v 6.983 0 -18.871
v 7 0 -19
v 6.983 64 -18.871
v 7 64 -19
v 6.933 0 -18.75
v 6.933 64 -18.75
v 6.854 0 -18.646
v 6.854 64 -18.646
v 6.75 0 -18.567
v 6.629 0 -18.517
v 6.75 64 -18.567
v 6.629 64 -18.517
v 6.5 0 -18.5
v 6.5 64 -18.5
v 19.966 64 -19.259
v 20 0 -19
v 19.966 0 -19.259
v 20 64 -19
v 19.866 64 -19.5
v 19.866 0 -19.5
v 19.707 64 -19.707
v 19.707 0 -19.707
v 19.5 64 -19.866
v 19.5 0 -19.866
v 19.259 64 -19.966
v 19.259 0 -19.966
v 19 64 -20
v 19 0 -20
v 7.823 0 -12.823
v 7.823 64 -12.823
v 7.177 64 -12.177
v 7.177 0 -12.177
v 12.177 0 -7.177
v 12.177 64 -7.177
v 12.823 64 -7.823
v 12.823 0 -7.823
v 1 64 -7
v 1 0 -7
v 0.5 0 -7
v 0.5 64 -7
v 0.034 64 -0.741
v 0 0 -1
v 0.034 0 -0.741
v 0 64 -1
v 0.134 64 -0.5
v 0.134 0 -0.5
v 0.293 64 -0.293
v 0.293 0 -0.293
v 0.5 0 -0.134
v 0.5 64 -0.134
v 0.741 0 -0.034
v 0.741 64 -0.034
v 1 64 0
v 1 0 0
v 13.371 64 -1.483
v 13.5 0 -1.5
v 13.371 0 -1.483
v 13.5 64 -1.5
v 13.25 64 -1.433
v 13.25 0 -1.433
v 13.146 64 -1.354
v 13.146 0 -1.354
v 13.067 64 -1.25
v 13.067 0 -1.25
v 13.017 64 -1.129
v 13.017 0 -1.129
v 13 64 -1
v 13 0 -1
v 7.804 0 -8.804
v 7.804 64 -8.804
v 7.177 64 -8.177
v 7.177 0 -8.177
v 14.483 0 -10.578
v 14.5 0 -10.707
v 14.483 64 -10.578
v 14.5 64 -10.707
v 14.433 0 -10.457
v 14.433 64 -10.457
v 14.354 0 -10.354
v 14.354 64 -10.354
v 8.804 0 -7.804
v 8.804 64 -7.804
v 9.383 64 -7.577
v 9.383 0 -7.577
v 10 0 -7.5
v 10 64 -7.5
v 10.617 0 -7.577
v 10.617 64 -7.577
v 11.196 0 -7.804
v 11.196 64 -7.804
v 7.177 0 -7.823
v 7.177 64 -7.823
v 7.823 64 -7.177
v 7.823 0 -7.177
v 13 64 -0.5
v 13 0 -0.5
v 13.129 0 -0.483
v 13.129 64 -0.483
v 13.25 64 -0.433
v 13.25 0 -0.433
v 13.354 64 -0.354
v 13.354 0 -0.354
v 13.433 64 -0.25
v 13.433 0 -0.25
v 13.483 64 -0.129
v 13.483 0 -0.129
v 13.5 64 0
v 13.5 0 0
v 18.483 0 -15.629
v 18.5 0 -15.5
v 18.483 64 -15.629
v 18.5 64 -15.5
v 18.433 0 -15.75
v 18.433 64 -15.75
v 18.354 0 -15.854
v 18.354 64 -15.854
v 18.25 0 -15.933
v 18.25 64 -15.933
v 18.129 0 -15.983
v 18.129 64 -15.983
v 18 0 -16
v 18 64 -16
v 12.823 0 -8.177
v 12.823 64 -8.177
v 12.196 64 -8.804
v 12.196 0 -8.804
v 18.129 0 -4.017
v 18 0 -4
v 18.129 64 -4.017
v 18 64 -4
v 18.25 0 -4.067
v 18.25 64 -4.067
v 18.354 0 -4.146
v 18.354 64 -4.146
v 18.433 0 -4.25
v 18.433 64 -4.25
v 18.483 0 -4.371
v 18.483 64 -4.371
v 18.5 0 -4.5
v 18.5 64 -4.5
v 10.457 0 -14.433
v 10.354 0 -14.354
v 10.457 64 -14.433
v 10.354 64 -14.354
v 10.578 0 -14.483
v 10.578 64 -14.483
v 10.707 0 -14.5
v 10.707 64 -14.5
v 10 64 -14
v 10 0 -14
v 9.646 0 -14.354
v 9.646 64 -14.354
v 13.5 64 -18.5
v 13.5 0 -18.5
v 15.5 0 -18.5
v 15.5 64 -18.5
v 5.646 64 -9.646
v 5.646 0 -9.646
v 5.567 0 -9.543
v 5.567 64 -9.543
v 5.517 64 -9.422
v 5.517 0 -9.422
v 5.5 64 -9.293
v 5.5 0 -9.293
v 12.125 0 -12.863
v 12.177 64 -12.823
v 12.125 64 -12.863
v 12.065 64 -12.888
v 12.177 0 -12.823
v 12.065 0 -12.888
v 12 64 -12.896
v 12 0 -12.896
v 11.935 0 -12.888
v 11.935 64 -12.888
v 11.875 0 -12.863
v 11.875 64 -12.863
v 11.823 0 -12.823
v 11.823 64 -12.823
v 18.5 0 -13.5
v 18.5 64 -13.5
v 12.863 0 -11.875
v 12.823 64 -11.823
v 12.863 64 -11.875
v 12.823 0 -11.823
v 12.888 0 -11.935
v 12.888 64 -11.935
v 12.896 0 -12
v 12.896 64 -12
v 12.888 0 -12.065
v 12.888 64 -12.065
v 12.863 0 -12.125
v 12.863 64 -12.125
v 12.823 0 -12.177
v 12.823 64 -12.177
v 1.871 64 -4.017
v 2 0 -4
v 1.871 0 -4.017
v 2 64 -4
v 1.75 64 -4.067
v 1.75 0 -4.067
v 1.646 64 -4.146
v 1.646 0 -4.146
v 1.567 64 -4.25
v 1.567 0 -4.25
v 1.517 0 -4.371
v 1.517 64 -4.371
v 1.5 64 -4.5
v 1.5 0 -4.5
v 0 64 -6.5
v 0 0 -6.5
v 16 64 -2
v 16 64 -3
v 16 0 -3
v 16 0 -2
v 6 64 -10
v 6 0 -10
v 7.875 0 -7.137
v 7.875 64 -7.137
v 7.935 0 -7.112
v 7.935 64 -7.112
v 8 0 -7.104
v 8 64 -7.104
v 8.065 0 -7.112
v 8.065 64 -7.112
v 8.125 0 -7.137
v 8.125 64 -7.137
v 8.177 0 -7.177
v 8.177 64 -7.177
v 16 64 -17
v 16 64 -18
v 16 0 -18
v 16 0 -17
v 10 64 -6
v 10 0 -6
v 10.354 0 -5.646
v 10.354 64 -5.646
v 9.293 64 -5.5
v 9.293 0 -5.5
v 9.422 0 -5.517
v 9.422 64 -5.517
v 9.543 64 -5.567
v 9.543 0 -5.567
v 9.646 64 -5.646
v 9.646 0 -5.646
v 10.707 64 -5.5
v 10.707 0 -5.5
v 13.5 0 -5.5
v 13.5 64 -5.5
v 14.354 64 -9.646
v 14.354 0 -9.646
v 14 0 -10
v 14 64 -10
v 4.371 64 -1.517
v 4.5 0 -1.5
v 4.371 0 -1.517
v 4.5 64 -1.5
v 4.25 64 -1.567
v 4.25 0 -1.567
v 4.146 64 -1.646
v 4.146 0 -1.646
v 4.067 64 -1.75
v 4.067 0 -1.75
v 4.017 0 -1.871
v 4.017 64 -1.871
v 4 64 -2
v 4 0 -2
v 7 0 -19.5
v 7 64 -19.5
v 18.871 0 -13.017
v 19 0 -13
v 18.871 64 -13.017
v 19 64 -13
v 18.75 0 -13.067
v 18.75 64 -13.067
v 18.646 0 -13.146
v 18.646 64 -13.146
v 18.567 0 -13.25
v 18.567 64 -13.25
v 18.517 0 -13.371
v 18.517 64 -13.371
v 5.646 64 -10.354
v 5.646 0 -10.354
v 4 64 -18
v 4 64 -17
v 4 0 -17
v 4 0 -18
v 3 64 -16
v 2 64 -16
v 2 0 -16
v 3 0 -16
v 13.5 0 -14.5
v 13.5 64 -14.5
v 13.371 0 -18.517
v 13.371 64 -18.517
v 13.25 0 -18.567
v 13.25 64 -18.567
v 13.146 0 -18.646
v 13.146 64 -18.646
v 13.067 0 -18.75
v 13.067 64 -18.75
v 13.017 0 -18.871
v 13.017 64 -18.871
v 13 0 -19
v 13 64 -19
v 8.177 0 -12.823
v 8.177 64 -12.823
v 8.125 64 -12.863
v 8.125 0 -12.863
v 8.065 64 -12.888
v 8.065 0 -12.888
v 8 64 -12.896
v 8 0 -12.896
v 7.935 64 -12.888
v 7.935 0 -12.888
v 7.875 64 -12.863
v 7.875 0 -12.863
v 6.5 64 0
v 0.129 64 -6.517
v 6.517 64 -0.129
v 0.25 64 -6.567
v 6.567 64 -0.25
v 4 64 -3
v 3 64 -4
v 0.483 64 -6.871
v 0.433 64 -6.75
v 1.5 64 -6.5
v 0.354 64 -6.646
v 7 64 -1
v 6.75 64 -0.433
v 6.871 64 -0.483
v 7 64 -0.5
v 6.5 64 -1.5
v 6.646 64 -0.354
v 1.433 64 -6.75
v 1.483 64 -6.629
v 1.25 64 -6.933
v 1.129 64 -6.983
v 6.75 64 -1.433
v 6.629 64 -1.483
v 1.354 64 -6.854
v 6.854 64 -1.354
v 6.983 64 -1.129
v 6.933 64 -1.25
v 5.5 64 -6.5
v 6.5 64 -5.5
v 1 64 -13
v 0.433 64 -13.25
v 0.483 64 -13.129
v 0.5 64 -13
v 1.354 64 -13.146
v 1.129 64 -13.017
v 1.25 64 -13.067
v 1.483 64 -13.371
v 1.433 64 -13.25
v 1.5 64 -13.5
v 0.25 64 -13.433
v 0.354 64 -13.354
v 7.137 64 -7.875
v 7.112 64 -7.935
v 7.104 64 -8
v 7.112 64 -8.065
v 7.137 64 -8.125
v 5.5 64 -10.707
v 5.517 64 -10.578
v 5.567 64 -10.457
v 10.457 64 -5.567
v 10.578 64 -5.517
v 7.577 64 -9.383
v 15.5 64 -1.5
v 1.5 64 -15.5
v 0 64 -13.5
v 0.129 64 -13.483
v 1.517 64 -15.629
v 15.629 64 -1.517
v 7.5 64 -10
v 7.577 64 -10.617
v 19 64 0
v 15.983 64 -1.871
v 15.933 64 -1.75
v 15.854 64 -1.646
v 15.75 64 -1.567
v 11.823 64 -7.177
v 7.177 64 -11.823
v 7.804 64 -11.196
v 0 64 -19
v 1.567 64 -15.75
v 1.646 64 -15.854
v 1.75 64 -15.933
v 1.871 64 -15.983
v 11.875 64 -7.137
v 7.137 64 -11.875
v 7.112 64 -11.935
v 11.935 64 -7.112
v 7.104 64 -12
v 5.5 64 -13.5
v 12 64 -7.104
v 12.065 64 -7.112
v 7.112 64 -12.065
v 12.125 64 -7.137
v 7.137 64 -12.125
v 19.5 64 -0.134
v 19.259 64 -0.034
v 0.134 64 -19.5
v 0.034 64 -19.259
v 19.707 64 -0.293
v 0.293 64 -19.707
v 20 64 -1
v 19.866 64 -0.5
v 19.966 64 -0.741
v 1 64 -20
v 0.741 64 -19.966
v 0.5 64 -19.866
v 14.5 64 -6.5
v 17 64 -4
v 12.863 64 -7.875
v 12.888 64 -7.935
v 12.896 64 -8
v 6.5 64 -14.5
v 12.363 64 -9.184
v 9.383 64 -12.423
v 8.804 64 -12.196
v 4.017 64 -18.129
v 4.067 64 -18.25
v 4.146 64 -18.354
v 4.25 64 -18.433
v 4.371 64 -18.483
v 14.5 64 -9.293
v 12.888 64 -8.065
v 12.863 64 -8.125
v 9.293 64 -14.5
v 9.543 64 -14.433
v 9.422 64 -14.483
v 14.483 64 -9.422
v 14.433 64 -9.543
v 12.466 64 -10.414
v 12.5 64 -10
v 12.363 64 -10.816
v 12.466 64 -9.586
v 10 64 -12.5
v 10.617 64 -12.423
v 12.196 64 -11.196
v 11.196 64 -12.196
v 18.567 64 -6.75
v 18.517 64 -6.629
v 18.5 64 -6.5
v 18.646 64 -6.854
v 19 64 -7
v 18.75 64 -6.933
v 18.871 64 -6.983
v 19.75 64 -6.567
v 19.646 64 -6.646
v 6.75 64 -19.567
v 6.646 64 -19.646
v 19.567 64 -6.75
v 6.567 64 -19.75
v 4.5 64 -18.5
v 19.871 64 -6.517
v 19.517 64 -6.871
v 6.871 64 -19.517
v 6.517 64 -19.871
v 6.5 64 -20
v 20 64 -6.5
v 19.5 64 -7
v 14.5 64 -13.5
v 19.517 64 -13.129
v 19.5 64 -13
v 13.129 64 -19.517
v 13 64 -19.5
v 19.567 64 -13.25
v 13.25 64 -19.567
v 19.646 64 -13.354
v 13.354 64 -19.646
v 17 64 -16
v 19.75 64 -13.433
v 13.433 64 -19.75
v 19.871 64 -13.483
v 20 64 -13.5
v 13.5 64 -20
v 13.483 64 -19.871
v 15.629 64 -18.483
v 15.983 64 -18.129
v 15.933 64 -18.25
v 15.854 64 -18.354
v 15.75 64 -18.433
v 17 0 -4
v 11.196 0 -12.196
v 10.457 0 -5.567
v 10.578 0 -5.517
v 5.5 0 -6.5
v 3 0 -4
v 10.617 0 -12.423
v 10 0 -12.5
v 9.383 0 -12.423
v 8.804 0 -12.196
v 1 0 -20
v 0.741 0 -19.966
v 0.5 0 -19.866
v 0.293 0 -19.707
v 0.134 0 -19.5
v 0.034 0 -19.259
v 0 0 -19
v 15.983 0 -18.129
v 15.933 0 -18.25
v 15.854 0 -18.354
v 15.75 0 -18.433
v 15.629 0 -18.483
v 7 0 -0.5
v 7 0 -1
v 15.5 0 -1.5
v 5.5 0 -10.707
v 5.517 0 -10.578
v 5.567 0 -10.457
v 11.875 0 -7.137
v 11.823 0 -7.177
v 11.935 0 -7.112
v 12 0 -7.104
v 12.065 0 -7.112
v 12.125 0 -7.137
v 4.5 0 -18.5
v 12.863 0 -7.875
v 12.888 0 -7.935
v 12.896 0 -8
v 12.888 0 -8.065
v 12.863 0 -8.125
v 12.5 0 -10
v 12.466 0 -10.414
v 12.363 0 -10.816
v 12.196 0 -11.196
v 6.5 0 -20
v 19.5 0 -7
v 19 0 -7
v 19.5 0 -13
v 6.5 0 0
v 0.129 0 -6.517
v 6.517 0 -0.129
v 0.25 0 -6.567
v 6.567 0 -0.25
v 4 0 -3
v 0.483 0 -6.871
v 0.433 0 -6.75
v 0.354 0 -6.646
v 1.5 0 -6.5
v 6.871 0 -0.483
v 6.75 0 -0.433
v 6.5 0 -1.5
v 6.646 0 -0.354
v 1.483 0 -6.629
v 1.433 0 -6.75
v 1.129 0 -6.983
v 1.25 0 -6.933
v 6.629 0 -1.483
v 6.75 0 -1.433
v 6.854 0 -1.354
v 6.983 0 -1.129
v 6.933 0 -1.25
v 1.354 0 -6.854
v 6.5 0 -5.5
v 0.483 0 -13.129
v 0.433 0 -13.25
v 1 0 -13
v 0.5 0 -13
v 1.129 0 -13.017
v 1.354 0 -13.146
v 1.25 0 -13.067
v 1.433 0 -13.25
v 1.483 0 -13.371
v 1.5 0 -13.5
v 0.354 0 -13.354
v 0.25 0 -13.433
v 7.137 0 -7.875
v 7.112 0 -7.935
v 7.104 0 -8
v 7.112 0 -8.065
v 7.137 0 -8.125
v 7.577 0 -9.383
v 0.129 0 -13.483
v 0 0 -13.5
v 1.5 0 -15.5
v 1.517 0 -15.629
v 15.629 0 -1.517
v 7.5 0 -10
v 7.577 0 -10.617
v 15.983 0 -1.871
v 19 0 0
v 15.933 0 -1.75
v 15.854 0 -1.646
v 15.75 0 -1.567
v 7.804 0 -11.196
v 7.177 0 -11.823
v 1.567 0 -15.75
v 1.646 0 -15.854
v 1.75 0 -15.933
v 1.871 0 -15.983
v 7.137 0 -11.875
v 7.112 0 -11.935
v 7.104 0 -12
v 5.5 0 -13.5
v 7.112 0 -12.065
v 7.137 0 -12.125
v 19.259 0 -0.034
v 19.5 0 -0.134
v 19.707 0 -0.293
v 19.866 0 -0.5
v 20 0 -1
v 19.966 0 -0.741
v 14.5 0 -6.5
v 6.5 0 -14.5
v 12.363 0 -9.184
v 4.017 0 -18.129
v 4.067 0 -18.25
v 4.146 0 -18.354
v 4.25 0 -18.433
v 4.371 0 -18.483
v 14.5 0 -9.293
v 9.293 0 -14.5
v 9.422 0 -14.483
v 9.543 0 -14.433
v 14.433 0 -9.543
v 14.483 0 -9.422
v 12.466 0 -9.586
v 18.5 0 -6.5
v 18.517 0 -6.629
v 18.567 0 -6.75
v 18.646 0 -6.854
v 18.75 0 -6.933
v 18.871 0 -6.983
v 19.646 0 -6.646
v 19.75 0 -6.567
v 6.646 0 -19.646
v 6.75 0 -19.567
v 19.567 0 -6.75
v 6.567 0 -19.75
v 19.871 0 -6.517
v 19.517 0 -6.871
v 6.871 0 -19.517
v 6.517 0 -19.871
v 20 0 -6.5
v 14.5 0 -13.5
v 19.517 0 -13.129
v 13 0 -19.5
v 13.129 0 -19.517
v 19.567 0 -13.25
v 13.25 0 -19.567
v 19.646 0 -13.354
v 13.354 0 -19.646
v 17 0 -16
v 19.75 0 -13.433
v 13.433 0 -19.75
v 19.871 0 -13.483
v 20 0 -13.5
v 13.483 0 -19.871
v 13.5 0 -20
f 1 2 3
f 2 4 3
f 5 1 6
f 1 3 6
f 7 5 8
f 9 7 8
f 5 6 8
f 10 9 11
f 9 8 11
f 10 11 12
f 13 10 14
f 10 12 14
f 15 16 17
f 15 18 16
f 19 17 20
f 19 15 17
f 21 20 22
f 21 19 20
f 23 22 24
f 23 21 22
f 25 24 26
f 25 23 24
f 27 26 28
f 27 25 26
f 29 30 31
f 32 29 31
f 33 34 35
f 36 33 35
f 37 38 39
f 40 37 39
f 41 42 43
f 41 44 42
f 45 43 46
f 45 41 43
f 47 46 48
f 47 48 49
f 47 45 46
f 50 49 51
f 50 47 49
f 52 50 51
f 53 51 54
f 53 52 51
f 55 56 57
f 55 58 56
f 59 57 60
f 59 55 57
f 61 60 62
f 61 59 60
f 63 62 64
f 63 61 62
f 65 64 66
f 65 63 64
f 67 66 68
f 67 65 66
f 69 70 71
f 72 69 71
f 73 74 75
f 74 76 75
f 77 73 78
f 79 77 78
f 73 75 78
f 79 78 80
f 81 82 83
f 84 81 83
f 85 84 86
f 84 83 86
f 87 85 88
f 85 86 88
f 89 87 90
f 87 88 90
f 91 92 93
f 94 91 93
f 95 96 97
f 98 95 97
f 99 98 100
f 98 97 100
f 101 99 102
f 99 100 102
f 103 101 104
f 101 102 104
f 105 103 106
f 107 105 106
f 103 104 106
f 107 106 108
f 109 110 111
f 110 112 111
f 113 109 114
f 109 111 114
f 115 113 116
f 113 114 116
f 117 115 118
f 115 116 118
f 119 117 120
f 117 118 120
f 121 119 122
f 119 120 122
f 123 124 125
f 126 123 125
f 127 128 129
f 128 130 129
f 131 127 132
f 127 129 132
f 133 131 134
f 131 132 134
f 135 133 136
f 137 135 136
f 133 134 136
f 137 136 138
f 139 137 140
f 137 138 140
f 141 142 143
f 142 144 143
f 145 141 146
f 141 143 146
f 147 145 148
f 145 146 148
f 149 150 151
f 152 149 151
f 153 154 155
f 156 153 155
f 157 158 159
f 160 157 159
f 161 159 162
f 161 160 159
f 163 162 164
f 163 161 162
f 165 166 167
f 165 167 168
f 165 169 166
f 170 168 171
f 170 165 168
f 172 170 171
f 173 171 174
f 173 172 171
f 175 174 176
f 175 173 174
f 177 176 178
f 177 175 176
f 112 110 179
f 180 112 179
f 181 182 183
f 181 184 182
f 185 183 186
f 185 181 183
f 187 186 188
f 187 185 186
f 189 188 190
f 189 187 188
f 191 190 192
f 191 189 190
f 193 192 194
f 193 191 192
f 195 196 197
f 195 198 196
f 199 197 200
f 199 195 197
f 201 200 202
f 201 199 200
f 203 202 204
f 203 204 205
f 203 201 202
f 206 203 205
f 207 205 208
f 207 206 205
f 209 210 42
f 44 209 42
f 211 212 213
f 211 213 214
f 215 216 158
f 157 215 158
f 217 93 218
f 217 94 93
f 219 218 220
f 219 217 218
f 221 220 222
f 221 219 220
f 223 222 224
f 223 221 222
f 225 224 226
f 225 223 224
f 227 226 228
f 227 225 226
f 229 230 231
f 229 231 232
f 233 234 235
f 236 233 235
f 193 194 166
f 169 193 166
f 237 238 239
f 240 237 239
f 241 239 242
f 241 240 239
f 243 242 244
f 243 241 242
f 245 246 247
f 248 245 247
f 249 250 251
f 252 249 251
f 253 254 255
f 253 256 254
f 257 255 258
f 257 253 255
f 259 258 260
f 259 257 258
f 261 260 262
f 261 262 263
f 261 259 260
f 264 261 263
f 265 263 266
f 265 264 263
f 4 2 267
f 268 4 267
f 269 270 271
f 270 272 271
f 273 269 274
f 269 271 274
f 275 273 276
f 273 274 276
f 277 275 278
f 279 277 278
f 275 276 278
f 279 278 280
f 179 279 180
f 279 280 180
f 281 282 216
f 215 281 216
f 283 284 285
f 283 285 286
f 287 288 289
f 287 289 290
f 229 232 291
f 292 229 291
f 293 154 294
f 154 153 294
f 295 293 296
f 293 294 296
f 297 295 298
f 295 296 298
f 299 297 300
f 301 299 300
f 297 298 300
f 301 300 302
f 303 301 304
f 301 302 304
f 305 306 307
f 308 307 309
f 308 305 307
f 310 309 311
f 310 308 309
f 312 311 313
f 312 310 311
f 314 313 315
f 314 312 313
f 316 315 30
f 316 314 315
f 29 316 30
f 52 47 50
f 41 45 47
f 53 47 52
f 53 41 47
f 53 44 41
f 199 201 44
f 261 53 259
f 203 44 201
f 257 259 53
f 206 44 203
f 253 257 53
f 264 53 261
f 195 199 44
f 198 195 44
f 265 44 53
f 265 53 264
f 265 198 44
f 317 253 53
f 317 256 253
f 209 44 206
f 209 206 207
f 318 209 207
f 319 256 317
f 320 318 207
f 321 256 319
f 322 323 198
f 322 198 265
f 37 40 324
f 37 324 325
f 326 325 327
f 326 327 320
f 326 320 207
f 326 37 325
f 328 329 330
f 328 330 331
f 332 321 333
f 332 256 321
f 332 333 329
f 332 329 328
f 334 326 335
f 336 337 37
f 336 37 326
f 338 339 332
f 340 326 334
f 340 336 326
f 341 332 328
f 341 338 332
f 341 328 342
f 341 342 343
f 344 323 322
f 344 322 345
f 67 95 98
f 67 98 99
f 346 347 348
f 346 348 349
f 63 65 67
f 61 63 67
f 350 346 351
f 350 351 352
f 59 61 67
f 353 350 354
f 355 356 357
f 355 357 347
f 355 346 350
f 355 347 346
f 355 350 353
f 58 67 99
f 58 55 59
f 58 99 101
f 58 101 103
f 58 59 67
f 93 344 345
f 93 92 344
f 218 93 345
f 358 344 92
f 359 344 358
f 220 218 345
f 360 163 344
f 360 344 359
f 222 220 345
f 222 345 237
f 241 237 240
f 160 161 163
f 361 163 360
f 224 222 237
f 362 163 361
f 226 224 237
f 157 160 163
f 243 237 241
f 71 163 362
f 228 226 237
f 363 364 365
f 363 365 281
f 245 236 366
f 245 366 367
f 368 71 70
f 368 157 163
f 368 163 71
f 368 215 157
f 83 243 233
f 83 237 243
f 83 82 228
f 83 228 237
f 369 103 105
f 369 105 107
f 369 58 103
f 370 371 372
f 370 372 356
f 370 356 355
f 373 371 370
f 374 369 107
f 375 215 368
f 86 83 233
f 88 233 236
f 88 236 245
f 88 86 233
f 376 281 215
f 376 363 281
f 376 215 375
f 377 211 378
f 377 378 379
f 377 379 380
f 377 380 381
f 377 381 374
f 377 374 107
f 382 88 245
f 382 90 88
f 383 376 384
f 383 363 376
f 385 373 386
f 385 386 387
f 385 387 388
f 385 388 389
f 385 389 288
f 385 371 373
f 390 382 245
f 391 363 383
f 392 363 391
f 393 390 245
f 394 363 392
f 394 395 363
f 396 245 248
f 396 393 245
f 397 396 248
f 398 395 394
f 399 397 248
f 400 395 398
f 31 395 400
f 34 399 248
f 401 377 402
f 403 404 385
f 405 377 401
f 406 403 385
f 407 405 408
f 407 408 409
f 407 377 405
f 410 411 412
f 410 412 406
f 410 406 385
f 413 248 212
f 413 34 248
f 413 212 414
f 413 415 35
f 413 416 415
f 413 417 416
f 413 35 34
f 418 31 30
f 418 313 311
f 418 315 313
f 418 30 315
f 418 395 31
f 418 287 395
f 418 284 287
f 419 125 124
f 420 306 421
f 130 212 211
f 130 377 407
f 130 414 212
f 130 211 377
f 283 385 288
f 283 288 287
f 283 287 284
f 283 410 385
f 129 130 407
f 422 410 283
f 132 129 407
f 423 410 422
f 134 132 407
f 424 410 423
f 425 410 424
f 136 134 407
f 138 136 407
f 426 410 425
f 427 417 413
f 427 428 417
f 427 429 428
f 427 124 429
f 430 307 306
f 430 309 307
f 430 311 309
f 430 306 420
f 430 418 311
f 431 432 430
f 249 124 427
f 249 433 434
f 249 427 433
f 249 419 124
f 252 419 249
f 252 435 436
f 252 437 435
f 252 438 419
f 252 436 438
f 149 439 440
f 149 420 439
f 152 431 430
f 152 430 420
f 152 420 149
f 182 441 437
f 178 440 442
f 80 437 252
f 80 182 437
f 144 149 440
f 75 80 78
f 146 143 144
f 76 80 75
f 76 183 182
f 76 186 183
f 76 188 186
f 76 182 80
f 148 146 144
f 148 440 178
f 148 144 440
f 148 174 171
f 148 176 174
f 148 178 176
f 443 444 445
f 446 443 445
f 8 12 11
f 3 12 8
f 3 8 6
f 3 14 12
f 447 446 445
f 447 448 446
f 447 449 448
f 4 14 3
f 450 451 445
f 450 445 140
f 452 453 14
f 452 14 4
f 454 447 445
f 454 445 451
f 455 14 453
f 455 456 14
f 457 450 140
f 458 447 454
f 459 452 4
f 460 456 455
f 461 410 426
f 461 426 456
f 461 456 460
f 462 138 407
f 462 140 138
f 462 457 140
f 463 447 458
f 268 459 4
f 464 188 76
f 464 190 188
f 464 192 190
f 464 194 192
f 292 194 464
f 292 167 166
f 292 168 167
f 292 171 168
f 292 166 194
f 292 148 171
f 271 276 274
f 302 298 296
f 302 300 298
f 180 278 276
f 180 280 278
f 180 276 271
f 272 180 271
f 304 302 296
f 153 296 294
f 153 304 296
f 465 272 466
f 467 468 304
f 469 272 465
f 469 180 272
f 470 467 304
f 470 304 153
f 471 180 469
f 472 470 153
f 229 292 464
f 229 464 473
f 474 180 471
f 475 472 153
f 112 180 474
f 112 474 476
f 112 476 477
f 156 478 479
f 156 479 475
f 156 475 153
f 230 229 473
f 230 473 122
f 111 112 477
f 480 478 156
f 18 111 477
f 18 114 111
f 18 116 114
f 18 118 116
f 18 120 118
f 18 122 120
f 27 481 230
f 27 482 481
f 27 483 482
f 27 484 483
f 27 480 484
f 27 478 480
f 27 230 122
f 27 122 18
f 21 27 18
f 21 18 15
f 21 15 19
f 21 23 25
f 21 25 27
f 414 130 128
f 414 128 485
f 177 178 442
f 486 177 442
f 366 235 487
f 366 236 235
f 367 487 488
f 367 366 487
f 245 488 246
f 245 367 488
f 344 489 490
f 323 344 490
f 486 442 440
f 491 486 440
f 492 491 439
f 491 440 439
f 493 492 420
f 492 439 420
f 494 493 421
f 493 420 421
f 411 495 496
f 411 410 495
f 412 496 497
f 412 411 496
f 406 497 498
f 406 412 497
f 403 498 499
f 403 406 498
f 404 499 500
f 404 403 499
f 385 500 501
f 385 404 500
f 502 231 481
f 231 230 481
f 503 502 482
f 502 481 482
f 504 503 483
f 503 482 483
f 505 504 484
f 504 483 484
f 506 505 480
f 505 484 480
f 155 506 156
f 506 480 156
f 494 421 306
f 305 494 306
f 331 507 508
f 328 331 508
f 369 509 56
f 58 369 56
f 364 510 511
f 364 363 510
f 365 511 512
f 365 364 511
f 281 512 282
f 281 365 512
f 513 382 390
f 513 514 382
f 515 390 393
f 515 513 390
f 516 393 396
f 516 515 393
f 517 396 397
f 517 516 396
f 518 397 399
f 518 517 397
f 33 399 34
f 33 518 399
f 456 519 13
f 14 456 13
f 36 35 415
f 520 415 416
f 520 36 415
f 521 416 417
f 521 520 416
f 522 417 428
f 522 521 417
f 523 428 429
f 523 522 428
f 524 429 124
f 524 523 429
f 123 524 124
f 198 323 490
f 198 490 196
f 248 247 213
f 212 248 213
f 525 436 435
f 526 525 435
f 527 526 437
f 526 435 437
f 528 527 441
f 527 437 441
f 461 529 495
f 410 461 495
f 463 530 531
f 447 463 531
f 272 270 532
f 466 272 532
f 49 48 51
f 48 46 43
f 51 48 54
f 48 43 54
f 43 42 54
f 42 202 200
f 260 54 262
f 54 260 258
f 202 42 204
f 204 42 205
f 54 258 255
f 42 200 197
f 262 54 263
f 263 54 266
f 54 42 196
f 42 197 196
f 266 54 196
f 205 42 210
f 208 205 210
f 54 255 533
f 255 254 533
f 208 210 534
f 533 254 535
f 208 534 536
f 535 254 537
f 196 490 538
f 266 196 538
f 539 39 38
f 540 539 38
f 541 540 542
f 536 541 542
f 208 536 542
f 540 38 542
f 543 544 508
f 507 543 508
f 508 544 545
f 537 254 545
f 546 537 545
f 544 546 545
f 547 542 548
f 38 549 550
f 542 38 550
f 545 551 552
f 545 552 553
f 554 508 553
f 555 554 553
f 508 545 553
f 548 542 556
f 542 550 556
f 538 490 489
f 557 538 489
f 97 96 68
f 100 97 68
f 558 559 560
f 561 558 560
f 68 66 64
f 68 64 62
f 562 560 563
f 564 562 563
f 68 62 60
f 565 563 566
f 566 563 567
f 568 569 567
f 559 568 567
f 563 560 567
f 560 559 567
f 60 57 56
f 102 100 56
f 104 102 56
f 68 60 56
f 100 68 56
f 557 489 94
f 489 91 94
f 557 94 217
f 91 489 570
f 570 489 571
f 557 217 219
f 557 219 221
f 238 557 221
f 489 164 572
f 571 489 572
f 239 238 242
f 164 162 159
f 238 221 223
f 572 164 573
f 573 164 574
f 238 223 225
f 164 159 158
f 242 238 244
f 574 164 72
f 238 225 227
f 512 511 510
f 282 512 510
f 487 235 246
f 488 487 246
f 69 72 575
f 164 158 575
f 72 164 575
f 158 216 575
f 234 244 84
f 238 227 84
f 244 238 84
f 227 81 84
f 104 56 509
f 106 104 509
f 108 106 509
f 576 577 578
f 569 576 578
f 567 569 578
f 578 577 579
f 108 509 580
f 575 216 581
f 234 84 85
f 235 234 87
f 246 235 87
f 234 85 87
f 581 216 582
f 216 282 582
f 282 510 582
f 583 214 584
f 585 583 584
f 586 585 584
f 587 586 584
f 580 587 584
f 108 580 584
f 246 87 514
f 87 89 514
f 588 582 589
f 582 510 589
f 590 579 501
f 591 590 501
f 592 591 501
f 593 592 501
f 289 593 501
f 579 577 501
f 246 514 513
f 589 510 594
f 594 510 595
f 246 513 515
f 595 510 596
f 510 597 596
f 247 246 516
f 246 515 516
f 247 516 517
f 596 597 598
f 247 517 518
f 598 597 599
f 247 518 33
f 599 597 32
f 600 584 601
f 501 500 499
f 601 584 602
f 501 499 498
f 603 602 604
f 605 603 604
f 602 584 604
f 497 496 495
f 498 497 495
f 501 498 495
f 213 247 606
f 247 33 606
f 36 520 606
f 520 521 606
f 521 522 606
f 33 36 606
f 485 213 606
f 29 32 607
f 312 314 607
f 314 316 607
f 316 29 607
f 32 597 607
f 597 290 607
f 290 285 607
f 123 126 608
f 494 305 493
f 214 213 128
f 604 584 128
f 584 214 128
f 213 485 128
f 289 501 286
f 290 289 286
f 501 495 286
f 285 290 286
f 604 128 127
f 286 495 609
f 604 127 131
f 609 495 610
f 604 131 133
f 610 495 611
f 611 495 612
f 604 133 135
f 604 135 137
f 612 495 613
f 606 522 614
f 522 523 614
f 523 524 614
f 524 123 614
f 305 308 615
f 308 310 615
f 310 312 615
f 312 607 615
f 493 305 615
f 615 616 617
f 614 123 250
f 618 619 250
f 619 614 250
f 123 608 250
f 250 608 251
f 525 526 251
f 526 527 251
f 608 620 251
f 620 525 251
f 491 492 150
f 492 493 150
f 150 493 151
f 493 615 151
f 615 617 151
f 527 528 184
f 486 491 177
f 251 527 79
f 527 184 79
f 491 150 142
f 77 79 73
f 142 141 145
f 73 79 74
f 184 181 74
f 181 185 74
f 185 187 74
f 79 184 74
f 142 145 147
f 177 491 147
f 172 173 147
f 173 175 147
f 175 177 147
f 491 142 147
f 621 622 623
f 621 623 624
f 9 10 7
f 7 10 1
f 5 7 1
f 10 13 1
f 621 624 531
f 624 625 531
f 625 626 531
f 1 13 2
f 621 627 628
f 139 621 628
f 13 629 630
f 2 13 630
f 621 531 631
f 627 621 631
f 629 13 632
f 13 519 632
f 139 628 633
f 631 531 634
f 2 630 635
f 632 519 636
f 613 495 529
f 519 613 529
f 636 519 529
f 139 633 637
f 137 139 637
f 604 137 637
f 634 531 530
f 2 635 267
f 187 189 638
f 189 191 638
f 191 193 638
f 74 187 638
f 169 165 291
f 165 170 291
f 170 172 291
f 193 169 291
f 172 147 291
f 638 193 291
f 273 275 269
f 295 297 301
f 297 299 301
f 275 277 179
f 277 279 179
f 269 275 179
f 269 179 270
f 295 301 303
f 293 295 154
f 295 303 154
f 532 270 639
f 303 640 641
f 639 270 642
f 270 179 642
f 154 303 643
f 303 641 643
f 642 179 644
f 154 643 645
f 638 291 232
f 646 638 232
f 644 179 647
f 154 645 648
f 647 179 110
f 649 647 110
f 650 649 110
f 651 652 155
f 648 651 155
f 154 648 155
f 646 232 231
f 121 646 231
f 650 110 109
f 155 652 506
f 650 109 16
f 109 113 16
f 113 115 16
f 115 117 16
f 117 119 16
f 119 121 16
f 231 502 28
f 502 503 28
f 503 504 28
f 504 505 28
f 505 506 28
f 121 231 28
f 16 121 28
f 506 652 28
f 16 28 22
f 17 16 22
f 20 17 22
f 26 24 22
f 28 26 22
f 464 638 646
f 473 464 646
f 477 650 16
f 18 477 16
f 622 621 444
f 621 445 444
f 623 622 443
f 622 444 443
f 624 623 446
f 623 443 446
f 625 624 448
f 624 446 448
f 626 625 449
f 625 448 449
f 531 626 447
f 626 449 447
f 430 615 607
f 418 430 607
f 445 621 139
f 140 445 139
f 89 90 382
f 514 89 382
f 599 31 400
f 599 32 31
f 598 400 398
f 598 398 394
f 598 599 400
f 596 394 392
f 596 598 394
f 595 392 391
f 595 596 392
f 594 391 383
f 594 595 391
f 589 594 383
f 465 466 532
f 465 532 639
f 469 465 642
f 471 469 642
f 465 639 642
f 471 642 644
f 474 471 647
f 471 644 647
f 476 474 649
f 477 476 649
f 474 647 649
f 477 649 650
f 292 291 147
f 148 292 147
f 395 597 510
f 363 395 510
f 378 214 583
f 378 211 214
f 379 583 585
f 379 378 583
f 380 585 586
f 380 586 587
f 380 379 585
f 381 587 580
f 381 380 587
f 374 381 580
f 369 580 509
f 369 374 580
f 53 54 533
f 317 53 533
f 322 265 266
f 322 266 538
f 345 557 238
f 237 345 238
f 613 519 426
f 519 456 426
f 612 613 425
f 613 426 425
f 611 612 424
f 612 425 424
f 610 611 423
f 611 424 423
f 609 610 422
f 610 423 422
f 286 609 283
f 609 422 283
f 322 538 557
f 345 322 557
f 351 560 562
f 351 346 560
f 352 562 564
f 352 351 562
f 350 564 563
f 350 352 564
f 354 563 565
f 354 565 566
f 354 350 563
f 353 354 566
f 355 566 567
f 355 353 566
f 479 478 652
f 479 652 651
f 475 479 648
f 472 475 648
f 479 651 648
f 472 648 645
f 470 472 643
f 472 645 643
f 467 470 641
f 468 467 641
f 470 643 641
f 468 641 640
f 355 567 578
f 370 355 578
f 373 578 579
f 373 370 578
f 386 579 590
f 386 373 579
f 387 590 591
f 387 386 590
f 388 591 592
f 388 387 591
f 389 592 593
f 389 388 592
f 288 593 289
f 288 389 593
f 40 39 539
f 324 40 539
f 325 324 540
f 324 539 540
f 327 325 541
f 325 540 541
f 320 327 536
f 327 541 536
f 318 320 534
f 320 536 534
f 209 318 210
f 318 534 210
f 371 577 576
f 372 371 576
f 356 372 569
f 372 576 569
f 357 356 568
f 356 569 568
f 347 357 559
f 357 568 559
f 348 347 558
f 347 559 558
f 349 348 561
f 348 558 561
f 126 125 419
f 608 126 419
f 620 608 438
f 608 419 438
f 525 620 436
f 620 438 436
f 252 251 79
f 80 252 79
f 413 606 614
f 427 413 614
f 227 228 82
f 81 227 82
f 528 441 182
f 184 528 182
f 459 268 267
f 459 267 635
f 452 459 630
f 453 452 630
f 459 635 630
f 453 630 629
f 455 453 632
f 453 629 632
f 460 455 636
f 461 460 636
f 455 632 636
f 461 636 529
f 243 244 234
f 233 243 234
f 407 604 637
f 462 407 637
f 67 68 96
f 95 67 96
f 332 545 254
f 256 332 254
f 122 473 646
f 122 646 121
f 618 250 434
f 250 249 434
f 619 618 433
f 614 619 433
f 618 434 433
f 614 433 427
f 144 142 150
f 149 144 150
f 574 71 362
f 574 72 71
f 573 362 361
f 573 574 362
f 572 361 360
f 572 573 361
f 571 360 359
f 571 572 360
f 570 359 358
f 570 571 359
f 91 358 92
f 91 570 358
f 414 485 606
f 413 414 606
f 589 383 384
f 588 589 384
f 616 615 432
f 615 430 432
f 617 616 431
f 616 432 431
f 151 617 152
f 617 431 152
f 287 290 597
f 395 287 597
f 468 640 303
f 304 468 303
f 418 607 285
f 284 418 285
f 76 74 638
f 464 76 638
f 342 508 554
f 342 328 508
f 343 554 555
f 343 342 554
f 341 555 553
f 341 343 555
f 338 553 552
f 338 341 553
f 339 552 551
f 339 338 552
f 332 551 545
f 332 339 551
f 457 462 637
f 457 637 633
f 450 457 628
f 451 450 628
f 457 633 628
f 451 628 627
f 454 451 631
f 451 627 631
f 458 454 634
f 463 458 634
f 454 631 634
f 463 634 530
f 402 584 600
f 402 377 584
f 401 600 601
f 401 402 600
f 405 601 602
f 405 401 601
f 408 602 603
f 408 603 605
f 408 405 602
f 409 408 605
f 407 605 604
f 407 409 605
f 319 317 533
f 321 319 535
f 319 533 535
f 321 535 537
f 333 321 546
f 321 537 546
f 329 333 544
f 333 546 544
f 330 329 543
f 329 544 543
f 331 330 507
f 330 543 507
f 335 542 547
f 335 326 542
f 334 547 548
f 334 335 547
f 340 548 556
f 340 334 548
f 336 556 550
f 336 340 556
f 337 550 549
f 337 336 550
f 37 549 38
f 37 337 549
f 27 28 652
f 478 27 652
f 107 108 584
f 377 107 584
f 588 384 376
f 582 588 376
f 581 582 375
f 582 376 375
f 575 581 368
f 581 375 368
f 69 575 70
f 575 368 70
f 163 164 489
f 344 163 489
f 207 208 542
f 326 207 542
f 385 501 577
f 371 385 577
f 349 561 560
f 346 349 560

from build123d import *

# Parameters (mm, degrees)
BOSS_EXTRUDE1_DEPTH = 64
FILLET1_R           = 1
CUT_EXTRUDE1_DEPTH  = 65
FILLET2_R           = 0.5
FILLET3_R           = 0.25


with BuildPart() as part:
    # Sketch3 → Boss-Extrude1 (new body)
    with BuildSketch(Plane(origin=(0, 0, 0), x_dir=(1, 0, 0), z_dir=(0, 1, 0))):
        with BuildLine():
            Line((7, 18.5), (7, 19.5))
            ThreePointArc((7, 19.5), (6.646446609, 19.646446609), (6.5, 20))
            Line((6.5, 20), (0, 20))
            Line((0, 20), (0, 13.5))
            ThreePointArc((0, 13.5), (0.353553391, 13.353553391), (0.5, 13))
            Line((0.5, 13), (1.5, 13))
            Line((1.5, 13), (1.5, 16))
            Line((1.5, 16), (3, 16))
            Line((3, 16), (5.5, 13.5))
            Line((5.5, 13.5), (5.5, 10.5))
            Line((5.5, 10.5), (6, 10))
            Line((6, 10), (5.5, 9.5))
            Line((5.5, 9.5), (5.5, 6.5))
            Line((5.5, 6.5), (3, 4))
            Line((3, 4), (1.5, 4))
            Line((1.5, 4), (1.5, 7))
            Line((1.5, 7), (0.5, 7))
            ThreePointArc((0.5, 7), (0.353553391, 6.646446609), (0, 6.5))
            Line((0, 6.5), (0, 0))
            Line((0, 0), (6.5, 0))
            ThreePointArc((6.5, 0), (6.646446609, 0.353553391), (7, 0.5))
            Line((7, 0.5), (7, 1.5))
            Line((7, 1.5), (4, 1.5))
            Line((4, 1.5), (4, 3))
            Line((4, 3), (6.5, 5.5))
            Line((6.5, 5.5), (9.5, 5.5))
            Line((9.5, 5.5), (10, 6))
            Line((10, 6), (10.5, 5.5))
            Line((10.5, 5.5), (13.5, 5.5))
            Line((13.5, 5.5), (16, 3))
            Line((16, 3), (16, 1.5))
            Line((16, 1.5), (13, 1.5))
            Line((13, 1.5), (13, 0.5))
            ThreePointArc((13, 0.5), (13.353553391, 0.353553391), (13.5, 0))
            Line((13.5, 0), (20, 0))
            Line((20, 0), (20, 6.5))
            ThreePointArc((20, 6.5), (19.646446609, 6.646446609), (19.5, 7))
            Line((19.5, 7), (18.5, 7))
            Line((18.5, 7), (18.5, 4))
            Line((18.5, 4), (17, 4))
            Line((17, 4), (14.5, 6.5))
            Line((14.5, 6.5), (14.5, 9.5))
            Line((14.5, 9.5), (14, 10))
            Line((14, 10), (14.5, 10.5))
            Line((14.5, 10.5), (14.5, 13.5))
            Line((14.5, 13.5), (17, 16))
            Line((17, 16), (18.5, 16))
            Line((18.5, 16), (18.5, 13))
            Line((18.5, 13), (19.5, 13))
            ThreePointArc((19.5, 13), (19.646446609, 13.353553391), (20, 13.5))
            Line((20, 13.5), (20, 20))
            Line((20, 20), (13.5, 20))
            ThreePointArc((13.5, 20), (13.353553391, 19.646446609), (13, 19.5))
            Line((13, 19.5), (13, 18.5))
            Line((13, 18.5), (16, 18.5))
            Line((16, 18.5), (16, 17))
            Line((16, 17), (13.5, 14.5))
            Line((13.5, 14.5), (10.5, 14.5))
            Line((10.5, 14.5), (10, 14))
            Line((10, 14), (9.5, 14.5))
            Line((9.5, 14.5), (6.5, 14.5))
            Line((6.5, 14.5), (4, 17))
            Line((4, 17), (4, 18.5))
            Line((4, 18.5), (7, 18.5))
        make_face()
    extrude(amount=BOSS_EXTRUDE1_DEPTH)

    # Fillet1
    fillet1_edges = [part.edges().sort_by_distance(p)[0] for p in [
        (20, 32, 0),
        (0, 32, 0),
        (0, 32, -20),
        (20, 32, -20),
    ]]
    fillet(fillet1_edges, radius=FILLET1_R)

    # Sketch4 → Cut-Extrude1 (cut, through all)
    with BuildSketch(Plane(origin=(0, 64, 0), x_dir=(1, 0, 0), z_dir=(0, 1, 0))):
        with BuildLine():
            Line((10, 11), (11.195582496, 12.195582496))
            ThreePointArc((11.195582496, 12.195582496), (10, 12.5), (8.804417504, 12.195582496))
            Line((8.804417504, 12.195582496), (10, 11))
        make_face()
        with BuildLine():
            ThreePointArc((12.195582496, 11.195582496), (11.767766953, 11.767766953), (11.195582496, 12.195582496))
            Line((11.195582496, 12.195582496), (10, 11))
            Line((10, 11), (11, 10))
            Line((11, 10), (12.195582496, 11.195582496))
        make_face()
        with BuildLine():
            Line((9, 10), (10, 11))
            Line((10, 11), (8.804417504, 12.195582496))
            ThreePointArc((8.804417504, 12.195582496), (8.232233047, 11.767766953), (7.804417504, 11.195582496))
            Line((7.804417504, 11.195582496), (9, 10))
        make_face()
        Polygon((11, 10), (10, 11), (9, 10), (10, 9), align=None)
        with BuildLine():
            Line((7.804417504, 8.804417504), (9, 10))
            Line((9, 10), (7.804417504, 11.195582496))
            ThreePointArc((7.804417504, 11.195582496), (7.5, 10), (7.804417504, 8.804417504))
        make_face()
        with BuildLine():
            Line((10, 9), (9, 10))
            Line((9, 10), (7.804417504, 8.804417504))
            ThreePointArc((7.804417504, 8.804417504), (8.232233047, 8.232233047), (8.804417504, 7.804417504))
            Line((8.804417504, 7.804417504), (10, 9))
        make_face()
        with BuildLine():
            Line((11.195582496, 7.804417504), (10, 9))
            Line((10, 9), (8.804417504, 7.804417504))
            ThreePointArc((8.804417504, 7.804417504), (10, 7.5), (11.195582496, 7.804417504))
        make_face()
        with BuildLine():
            Line((12.195582496, 8.804417504), (11, 10))
            Line((11, 10), (10, 9))
            Line((10, 9), (11.195582496, 7.804417504))
            ThreePointArc((11.195582496, 7.804417504), (11.767766953, 8.232233047), (12.195582496, 8.804417504))
        make_face()
        with BuildLine():
            ThreePointArc((12.5, 10), (12.422700584, 10.616864556), (12.195582496, 11.195582496))
            Line((12.195582496, 11.195582496), (11, 10))
            Line((11, 10), (12.195582496, 8.804417504))
            ThreePointArc((12.195582496, 8.804417504), (12.422700584, 9.383135444), (12.5, 10))
        make_face()
        with BuildLine():
            ThreePointArc((8.804417504, 7.804417504), (8.232233047, 8.232233047), (7.804417504, 8.804417504))
            Line((7.804417504, 8.804417504), (7, 8))
            Line((7, 8), (8, 7))
            Line((8, 7), (8.804417504, 7.804417504))
        make_face()
        with BuildLine():
            Line((13, 8), (12.195582496, 8.804417504))
            ThreePointArc((12.195582496, 8.804417504), (11.767766953, 8.232233047), (11.195582496, 7.804417504))
            Line((11.195582496, 7.804417504), (12, 7))
            Line((12, 7), (13, 8))
        make_face()
        with BuildLine():
            Line((13, 12), (12, 13))
            Line((12, 13), (11.195582496, 12.195582496))
            ThreePointArc((11.195582496, 12.195582496), (11.767766953, 11.767766953), (12.195582496, 11.195582496))
            Line((12.195582496, 11.195582496), (13, 12))
        make_face()
        with BuildLine():
            ThreePointArc((7.804417504, 11.195582496), (8.232233047, 11.767766953), (8.804417504, 12.195582496))
            Line((8.804417504, 12.195582496), (8, 13))
            Line((8, 13), (7, 12))
            Line((7, 12), (7.804417504, 11.195582496))
        make_face()
    extrude(amount=-CUT_EXTRUDE1_DEPTH, mode=Mode.SUBTRACT)

    # Fillet2
    fillet2_edges = [part.edges().sort_by_distance(p)[0] for p in [
        (18.5, 32, -13),
        (18.5, 32, -16),
        (14.5, 32, -10.5),
        (14.5, 32, -9.5),
        (18.5, 32, -4),
        (18.5, 32, -7),
        (13, 32, -1.5),
        (16, 32, -1.5),
        (10.5, 32, -5.5),
        (9.5, 32, -5.5),
        (4, 32, -1.5),
        (7, 32, -1.5),
        (1.5, 32, -7),
        (1.5, 32, -4),
        (5.5, 32, -9.5),
        (5.5, 32, -10.5),
        (1.5, 32, -16),
        (1.5, 32, -13),
        (7, 32, -18.5),
        (4, 32, -18.5),
        (9.5, 32, -14.5),
        (10.5, 32, -14.5),
        (16, 32, -18.5),
        (13, 32, -18.5),
    ]]
    fillet(fillet2_edges, radius=FILLET2_R)

    # Fillet3
    fillet3_edges = [part.edges().sort_by_distance(p)[0] for p in [
        (7, 32, -12),
        (8, 32, -13),
        (12, 32, -13),
        (13, 32, -12),
        (13, 32, -8),
        (12, 32, -7),
        (8, 32, -7),
        (7, 32, -8),
    ]]
    fillet(fillet3_edges, radius=FILLET3_R)


solid = part.part
